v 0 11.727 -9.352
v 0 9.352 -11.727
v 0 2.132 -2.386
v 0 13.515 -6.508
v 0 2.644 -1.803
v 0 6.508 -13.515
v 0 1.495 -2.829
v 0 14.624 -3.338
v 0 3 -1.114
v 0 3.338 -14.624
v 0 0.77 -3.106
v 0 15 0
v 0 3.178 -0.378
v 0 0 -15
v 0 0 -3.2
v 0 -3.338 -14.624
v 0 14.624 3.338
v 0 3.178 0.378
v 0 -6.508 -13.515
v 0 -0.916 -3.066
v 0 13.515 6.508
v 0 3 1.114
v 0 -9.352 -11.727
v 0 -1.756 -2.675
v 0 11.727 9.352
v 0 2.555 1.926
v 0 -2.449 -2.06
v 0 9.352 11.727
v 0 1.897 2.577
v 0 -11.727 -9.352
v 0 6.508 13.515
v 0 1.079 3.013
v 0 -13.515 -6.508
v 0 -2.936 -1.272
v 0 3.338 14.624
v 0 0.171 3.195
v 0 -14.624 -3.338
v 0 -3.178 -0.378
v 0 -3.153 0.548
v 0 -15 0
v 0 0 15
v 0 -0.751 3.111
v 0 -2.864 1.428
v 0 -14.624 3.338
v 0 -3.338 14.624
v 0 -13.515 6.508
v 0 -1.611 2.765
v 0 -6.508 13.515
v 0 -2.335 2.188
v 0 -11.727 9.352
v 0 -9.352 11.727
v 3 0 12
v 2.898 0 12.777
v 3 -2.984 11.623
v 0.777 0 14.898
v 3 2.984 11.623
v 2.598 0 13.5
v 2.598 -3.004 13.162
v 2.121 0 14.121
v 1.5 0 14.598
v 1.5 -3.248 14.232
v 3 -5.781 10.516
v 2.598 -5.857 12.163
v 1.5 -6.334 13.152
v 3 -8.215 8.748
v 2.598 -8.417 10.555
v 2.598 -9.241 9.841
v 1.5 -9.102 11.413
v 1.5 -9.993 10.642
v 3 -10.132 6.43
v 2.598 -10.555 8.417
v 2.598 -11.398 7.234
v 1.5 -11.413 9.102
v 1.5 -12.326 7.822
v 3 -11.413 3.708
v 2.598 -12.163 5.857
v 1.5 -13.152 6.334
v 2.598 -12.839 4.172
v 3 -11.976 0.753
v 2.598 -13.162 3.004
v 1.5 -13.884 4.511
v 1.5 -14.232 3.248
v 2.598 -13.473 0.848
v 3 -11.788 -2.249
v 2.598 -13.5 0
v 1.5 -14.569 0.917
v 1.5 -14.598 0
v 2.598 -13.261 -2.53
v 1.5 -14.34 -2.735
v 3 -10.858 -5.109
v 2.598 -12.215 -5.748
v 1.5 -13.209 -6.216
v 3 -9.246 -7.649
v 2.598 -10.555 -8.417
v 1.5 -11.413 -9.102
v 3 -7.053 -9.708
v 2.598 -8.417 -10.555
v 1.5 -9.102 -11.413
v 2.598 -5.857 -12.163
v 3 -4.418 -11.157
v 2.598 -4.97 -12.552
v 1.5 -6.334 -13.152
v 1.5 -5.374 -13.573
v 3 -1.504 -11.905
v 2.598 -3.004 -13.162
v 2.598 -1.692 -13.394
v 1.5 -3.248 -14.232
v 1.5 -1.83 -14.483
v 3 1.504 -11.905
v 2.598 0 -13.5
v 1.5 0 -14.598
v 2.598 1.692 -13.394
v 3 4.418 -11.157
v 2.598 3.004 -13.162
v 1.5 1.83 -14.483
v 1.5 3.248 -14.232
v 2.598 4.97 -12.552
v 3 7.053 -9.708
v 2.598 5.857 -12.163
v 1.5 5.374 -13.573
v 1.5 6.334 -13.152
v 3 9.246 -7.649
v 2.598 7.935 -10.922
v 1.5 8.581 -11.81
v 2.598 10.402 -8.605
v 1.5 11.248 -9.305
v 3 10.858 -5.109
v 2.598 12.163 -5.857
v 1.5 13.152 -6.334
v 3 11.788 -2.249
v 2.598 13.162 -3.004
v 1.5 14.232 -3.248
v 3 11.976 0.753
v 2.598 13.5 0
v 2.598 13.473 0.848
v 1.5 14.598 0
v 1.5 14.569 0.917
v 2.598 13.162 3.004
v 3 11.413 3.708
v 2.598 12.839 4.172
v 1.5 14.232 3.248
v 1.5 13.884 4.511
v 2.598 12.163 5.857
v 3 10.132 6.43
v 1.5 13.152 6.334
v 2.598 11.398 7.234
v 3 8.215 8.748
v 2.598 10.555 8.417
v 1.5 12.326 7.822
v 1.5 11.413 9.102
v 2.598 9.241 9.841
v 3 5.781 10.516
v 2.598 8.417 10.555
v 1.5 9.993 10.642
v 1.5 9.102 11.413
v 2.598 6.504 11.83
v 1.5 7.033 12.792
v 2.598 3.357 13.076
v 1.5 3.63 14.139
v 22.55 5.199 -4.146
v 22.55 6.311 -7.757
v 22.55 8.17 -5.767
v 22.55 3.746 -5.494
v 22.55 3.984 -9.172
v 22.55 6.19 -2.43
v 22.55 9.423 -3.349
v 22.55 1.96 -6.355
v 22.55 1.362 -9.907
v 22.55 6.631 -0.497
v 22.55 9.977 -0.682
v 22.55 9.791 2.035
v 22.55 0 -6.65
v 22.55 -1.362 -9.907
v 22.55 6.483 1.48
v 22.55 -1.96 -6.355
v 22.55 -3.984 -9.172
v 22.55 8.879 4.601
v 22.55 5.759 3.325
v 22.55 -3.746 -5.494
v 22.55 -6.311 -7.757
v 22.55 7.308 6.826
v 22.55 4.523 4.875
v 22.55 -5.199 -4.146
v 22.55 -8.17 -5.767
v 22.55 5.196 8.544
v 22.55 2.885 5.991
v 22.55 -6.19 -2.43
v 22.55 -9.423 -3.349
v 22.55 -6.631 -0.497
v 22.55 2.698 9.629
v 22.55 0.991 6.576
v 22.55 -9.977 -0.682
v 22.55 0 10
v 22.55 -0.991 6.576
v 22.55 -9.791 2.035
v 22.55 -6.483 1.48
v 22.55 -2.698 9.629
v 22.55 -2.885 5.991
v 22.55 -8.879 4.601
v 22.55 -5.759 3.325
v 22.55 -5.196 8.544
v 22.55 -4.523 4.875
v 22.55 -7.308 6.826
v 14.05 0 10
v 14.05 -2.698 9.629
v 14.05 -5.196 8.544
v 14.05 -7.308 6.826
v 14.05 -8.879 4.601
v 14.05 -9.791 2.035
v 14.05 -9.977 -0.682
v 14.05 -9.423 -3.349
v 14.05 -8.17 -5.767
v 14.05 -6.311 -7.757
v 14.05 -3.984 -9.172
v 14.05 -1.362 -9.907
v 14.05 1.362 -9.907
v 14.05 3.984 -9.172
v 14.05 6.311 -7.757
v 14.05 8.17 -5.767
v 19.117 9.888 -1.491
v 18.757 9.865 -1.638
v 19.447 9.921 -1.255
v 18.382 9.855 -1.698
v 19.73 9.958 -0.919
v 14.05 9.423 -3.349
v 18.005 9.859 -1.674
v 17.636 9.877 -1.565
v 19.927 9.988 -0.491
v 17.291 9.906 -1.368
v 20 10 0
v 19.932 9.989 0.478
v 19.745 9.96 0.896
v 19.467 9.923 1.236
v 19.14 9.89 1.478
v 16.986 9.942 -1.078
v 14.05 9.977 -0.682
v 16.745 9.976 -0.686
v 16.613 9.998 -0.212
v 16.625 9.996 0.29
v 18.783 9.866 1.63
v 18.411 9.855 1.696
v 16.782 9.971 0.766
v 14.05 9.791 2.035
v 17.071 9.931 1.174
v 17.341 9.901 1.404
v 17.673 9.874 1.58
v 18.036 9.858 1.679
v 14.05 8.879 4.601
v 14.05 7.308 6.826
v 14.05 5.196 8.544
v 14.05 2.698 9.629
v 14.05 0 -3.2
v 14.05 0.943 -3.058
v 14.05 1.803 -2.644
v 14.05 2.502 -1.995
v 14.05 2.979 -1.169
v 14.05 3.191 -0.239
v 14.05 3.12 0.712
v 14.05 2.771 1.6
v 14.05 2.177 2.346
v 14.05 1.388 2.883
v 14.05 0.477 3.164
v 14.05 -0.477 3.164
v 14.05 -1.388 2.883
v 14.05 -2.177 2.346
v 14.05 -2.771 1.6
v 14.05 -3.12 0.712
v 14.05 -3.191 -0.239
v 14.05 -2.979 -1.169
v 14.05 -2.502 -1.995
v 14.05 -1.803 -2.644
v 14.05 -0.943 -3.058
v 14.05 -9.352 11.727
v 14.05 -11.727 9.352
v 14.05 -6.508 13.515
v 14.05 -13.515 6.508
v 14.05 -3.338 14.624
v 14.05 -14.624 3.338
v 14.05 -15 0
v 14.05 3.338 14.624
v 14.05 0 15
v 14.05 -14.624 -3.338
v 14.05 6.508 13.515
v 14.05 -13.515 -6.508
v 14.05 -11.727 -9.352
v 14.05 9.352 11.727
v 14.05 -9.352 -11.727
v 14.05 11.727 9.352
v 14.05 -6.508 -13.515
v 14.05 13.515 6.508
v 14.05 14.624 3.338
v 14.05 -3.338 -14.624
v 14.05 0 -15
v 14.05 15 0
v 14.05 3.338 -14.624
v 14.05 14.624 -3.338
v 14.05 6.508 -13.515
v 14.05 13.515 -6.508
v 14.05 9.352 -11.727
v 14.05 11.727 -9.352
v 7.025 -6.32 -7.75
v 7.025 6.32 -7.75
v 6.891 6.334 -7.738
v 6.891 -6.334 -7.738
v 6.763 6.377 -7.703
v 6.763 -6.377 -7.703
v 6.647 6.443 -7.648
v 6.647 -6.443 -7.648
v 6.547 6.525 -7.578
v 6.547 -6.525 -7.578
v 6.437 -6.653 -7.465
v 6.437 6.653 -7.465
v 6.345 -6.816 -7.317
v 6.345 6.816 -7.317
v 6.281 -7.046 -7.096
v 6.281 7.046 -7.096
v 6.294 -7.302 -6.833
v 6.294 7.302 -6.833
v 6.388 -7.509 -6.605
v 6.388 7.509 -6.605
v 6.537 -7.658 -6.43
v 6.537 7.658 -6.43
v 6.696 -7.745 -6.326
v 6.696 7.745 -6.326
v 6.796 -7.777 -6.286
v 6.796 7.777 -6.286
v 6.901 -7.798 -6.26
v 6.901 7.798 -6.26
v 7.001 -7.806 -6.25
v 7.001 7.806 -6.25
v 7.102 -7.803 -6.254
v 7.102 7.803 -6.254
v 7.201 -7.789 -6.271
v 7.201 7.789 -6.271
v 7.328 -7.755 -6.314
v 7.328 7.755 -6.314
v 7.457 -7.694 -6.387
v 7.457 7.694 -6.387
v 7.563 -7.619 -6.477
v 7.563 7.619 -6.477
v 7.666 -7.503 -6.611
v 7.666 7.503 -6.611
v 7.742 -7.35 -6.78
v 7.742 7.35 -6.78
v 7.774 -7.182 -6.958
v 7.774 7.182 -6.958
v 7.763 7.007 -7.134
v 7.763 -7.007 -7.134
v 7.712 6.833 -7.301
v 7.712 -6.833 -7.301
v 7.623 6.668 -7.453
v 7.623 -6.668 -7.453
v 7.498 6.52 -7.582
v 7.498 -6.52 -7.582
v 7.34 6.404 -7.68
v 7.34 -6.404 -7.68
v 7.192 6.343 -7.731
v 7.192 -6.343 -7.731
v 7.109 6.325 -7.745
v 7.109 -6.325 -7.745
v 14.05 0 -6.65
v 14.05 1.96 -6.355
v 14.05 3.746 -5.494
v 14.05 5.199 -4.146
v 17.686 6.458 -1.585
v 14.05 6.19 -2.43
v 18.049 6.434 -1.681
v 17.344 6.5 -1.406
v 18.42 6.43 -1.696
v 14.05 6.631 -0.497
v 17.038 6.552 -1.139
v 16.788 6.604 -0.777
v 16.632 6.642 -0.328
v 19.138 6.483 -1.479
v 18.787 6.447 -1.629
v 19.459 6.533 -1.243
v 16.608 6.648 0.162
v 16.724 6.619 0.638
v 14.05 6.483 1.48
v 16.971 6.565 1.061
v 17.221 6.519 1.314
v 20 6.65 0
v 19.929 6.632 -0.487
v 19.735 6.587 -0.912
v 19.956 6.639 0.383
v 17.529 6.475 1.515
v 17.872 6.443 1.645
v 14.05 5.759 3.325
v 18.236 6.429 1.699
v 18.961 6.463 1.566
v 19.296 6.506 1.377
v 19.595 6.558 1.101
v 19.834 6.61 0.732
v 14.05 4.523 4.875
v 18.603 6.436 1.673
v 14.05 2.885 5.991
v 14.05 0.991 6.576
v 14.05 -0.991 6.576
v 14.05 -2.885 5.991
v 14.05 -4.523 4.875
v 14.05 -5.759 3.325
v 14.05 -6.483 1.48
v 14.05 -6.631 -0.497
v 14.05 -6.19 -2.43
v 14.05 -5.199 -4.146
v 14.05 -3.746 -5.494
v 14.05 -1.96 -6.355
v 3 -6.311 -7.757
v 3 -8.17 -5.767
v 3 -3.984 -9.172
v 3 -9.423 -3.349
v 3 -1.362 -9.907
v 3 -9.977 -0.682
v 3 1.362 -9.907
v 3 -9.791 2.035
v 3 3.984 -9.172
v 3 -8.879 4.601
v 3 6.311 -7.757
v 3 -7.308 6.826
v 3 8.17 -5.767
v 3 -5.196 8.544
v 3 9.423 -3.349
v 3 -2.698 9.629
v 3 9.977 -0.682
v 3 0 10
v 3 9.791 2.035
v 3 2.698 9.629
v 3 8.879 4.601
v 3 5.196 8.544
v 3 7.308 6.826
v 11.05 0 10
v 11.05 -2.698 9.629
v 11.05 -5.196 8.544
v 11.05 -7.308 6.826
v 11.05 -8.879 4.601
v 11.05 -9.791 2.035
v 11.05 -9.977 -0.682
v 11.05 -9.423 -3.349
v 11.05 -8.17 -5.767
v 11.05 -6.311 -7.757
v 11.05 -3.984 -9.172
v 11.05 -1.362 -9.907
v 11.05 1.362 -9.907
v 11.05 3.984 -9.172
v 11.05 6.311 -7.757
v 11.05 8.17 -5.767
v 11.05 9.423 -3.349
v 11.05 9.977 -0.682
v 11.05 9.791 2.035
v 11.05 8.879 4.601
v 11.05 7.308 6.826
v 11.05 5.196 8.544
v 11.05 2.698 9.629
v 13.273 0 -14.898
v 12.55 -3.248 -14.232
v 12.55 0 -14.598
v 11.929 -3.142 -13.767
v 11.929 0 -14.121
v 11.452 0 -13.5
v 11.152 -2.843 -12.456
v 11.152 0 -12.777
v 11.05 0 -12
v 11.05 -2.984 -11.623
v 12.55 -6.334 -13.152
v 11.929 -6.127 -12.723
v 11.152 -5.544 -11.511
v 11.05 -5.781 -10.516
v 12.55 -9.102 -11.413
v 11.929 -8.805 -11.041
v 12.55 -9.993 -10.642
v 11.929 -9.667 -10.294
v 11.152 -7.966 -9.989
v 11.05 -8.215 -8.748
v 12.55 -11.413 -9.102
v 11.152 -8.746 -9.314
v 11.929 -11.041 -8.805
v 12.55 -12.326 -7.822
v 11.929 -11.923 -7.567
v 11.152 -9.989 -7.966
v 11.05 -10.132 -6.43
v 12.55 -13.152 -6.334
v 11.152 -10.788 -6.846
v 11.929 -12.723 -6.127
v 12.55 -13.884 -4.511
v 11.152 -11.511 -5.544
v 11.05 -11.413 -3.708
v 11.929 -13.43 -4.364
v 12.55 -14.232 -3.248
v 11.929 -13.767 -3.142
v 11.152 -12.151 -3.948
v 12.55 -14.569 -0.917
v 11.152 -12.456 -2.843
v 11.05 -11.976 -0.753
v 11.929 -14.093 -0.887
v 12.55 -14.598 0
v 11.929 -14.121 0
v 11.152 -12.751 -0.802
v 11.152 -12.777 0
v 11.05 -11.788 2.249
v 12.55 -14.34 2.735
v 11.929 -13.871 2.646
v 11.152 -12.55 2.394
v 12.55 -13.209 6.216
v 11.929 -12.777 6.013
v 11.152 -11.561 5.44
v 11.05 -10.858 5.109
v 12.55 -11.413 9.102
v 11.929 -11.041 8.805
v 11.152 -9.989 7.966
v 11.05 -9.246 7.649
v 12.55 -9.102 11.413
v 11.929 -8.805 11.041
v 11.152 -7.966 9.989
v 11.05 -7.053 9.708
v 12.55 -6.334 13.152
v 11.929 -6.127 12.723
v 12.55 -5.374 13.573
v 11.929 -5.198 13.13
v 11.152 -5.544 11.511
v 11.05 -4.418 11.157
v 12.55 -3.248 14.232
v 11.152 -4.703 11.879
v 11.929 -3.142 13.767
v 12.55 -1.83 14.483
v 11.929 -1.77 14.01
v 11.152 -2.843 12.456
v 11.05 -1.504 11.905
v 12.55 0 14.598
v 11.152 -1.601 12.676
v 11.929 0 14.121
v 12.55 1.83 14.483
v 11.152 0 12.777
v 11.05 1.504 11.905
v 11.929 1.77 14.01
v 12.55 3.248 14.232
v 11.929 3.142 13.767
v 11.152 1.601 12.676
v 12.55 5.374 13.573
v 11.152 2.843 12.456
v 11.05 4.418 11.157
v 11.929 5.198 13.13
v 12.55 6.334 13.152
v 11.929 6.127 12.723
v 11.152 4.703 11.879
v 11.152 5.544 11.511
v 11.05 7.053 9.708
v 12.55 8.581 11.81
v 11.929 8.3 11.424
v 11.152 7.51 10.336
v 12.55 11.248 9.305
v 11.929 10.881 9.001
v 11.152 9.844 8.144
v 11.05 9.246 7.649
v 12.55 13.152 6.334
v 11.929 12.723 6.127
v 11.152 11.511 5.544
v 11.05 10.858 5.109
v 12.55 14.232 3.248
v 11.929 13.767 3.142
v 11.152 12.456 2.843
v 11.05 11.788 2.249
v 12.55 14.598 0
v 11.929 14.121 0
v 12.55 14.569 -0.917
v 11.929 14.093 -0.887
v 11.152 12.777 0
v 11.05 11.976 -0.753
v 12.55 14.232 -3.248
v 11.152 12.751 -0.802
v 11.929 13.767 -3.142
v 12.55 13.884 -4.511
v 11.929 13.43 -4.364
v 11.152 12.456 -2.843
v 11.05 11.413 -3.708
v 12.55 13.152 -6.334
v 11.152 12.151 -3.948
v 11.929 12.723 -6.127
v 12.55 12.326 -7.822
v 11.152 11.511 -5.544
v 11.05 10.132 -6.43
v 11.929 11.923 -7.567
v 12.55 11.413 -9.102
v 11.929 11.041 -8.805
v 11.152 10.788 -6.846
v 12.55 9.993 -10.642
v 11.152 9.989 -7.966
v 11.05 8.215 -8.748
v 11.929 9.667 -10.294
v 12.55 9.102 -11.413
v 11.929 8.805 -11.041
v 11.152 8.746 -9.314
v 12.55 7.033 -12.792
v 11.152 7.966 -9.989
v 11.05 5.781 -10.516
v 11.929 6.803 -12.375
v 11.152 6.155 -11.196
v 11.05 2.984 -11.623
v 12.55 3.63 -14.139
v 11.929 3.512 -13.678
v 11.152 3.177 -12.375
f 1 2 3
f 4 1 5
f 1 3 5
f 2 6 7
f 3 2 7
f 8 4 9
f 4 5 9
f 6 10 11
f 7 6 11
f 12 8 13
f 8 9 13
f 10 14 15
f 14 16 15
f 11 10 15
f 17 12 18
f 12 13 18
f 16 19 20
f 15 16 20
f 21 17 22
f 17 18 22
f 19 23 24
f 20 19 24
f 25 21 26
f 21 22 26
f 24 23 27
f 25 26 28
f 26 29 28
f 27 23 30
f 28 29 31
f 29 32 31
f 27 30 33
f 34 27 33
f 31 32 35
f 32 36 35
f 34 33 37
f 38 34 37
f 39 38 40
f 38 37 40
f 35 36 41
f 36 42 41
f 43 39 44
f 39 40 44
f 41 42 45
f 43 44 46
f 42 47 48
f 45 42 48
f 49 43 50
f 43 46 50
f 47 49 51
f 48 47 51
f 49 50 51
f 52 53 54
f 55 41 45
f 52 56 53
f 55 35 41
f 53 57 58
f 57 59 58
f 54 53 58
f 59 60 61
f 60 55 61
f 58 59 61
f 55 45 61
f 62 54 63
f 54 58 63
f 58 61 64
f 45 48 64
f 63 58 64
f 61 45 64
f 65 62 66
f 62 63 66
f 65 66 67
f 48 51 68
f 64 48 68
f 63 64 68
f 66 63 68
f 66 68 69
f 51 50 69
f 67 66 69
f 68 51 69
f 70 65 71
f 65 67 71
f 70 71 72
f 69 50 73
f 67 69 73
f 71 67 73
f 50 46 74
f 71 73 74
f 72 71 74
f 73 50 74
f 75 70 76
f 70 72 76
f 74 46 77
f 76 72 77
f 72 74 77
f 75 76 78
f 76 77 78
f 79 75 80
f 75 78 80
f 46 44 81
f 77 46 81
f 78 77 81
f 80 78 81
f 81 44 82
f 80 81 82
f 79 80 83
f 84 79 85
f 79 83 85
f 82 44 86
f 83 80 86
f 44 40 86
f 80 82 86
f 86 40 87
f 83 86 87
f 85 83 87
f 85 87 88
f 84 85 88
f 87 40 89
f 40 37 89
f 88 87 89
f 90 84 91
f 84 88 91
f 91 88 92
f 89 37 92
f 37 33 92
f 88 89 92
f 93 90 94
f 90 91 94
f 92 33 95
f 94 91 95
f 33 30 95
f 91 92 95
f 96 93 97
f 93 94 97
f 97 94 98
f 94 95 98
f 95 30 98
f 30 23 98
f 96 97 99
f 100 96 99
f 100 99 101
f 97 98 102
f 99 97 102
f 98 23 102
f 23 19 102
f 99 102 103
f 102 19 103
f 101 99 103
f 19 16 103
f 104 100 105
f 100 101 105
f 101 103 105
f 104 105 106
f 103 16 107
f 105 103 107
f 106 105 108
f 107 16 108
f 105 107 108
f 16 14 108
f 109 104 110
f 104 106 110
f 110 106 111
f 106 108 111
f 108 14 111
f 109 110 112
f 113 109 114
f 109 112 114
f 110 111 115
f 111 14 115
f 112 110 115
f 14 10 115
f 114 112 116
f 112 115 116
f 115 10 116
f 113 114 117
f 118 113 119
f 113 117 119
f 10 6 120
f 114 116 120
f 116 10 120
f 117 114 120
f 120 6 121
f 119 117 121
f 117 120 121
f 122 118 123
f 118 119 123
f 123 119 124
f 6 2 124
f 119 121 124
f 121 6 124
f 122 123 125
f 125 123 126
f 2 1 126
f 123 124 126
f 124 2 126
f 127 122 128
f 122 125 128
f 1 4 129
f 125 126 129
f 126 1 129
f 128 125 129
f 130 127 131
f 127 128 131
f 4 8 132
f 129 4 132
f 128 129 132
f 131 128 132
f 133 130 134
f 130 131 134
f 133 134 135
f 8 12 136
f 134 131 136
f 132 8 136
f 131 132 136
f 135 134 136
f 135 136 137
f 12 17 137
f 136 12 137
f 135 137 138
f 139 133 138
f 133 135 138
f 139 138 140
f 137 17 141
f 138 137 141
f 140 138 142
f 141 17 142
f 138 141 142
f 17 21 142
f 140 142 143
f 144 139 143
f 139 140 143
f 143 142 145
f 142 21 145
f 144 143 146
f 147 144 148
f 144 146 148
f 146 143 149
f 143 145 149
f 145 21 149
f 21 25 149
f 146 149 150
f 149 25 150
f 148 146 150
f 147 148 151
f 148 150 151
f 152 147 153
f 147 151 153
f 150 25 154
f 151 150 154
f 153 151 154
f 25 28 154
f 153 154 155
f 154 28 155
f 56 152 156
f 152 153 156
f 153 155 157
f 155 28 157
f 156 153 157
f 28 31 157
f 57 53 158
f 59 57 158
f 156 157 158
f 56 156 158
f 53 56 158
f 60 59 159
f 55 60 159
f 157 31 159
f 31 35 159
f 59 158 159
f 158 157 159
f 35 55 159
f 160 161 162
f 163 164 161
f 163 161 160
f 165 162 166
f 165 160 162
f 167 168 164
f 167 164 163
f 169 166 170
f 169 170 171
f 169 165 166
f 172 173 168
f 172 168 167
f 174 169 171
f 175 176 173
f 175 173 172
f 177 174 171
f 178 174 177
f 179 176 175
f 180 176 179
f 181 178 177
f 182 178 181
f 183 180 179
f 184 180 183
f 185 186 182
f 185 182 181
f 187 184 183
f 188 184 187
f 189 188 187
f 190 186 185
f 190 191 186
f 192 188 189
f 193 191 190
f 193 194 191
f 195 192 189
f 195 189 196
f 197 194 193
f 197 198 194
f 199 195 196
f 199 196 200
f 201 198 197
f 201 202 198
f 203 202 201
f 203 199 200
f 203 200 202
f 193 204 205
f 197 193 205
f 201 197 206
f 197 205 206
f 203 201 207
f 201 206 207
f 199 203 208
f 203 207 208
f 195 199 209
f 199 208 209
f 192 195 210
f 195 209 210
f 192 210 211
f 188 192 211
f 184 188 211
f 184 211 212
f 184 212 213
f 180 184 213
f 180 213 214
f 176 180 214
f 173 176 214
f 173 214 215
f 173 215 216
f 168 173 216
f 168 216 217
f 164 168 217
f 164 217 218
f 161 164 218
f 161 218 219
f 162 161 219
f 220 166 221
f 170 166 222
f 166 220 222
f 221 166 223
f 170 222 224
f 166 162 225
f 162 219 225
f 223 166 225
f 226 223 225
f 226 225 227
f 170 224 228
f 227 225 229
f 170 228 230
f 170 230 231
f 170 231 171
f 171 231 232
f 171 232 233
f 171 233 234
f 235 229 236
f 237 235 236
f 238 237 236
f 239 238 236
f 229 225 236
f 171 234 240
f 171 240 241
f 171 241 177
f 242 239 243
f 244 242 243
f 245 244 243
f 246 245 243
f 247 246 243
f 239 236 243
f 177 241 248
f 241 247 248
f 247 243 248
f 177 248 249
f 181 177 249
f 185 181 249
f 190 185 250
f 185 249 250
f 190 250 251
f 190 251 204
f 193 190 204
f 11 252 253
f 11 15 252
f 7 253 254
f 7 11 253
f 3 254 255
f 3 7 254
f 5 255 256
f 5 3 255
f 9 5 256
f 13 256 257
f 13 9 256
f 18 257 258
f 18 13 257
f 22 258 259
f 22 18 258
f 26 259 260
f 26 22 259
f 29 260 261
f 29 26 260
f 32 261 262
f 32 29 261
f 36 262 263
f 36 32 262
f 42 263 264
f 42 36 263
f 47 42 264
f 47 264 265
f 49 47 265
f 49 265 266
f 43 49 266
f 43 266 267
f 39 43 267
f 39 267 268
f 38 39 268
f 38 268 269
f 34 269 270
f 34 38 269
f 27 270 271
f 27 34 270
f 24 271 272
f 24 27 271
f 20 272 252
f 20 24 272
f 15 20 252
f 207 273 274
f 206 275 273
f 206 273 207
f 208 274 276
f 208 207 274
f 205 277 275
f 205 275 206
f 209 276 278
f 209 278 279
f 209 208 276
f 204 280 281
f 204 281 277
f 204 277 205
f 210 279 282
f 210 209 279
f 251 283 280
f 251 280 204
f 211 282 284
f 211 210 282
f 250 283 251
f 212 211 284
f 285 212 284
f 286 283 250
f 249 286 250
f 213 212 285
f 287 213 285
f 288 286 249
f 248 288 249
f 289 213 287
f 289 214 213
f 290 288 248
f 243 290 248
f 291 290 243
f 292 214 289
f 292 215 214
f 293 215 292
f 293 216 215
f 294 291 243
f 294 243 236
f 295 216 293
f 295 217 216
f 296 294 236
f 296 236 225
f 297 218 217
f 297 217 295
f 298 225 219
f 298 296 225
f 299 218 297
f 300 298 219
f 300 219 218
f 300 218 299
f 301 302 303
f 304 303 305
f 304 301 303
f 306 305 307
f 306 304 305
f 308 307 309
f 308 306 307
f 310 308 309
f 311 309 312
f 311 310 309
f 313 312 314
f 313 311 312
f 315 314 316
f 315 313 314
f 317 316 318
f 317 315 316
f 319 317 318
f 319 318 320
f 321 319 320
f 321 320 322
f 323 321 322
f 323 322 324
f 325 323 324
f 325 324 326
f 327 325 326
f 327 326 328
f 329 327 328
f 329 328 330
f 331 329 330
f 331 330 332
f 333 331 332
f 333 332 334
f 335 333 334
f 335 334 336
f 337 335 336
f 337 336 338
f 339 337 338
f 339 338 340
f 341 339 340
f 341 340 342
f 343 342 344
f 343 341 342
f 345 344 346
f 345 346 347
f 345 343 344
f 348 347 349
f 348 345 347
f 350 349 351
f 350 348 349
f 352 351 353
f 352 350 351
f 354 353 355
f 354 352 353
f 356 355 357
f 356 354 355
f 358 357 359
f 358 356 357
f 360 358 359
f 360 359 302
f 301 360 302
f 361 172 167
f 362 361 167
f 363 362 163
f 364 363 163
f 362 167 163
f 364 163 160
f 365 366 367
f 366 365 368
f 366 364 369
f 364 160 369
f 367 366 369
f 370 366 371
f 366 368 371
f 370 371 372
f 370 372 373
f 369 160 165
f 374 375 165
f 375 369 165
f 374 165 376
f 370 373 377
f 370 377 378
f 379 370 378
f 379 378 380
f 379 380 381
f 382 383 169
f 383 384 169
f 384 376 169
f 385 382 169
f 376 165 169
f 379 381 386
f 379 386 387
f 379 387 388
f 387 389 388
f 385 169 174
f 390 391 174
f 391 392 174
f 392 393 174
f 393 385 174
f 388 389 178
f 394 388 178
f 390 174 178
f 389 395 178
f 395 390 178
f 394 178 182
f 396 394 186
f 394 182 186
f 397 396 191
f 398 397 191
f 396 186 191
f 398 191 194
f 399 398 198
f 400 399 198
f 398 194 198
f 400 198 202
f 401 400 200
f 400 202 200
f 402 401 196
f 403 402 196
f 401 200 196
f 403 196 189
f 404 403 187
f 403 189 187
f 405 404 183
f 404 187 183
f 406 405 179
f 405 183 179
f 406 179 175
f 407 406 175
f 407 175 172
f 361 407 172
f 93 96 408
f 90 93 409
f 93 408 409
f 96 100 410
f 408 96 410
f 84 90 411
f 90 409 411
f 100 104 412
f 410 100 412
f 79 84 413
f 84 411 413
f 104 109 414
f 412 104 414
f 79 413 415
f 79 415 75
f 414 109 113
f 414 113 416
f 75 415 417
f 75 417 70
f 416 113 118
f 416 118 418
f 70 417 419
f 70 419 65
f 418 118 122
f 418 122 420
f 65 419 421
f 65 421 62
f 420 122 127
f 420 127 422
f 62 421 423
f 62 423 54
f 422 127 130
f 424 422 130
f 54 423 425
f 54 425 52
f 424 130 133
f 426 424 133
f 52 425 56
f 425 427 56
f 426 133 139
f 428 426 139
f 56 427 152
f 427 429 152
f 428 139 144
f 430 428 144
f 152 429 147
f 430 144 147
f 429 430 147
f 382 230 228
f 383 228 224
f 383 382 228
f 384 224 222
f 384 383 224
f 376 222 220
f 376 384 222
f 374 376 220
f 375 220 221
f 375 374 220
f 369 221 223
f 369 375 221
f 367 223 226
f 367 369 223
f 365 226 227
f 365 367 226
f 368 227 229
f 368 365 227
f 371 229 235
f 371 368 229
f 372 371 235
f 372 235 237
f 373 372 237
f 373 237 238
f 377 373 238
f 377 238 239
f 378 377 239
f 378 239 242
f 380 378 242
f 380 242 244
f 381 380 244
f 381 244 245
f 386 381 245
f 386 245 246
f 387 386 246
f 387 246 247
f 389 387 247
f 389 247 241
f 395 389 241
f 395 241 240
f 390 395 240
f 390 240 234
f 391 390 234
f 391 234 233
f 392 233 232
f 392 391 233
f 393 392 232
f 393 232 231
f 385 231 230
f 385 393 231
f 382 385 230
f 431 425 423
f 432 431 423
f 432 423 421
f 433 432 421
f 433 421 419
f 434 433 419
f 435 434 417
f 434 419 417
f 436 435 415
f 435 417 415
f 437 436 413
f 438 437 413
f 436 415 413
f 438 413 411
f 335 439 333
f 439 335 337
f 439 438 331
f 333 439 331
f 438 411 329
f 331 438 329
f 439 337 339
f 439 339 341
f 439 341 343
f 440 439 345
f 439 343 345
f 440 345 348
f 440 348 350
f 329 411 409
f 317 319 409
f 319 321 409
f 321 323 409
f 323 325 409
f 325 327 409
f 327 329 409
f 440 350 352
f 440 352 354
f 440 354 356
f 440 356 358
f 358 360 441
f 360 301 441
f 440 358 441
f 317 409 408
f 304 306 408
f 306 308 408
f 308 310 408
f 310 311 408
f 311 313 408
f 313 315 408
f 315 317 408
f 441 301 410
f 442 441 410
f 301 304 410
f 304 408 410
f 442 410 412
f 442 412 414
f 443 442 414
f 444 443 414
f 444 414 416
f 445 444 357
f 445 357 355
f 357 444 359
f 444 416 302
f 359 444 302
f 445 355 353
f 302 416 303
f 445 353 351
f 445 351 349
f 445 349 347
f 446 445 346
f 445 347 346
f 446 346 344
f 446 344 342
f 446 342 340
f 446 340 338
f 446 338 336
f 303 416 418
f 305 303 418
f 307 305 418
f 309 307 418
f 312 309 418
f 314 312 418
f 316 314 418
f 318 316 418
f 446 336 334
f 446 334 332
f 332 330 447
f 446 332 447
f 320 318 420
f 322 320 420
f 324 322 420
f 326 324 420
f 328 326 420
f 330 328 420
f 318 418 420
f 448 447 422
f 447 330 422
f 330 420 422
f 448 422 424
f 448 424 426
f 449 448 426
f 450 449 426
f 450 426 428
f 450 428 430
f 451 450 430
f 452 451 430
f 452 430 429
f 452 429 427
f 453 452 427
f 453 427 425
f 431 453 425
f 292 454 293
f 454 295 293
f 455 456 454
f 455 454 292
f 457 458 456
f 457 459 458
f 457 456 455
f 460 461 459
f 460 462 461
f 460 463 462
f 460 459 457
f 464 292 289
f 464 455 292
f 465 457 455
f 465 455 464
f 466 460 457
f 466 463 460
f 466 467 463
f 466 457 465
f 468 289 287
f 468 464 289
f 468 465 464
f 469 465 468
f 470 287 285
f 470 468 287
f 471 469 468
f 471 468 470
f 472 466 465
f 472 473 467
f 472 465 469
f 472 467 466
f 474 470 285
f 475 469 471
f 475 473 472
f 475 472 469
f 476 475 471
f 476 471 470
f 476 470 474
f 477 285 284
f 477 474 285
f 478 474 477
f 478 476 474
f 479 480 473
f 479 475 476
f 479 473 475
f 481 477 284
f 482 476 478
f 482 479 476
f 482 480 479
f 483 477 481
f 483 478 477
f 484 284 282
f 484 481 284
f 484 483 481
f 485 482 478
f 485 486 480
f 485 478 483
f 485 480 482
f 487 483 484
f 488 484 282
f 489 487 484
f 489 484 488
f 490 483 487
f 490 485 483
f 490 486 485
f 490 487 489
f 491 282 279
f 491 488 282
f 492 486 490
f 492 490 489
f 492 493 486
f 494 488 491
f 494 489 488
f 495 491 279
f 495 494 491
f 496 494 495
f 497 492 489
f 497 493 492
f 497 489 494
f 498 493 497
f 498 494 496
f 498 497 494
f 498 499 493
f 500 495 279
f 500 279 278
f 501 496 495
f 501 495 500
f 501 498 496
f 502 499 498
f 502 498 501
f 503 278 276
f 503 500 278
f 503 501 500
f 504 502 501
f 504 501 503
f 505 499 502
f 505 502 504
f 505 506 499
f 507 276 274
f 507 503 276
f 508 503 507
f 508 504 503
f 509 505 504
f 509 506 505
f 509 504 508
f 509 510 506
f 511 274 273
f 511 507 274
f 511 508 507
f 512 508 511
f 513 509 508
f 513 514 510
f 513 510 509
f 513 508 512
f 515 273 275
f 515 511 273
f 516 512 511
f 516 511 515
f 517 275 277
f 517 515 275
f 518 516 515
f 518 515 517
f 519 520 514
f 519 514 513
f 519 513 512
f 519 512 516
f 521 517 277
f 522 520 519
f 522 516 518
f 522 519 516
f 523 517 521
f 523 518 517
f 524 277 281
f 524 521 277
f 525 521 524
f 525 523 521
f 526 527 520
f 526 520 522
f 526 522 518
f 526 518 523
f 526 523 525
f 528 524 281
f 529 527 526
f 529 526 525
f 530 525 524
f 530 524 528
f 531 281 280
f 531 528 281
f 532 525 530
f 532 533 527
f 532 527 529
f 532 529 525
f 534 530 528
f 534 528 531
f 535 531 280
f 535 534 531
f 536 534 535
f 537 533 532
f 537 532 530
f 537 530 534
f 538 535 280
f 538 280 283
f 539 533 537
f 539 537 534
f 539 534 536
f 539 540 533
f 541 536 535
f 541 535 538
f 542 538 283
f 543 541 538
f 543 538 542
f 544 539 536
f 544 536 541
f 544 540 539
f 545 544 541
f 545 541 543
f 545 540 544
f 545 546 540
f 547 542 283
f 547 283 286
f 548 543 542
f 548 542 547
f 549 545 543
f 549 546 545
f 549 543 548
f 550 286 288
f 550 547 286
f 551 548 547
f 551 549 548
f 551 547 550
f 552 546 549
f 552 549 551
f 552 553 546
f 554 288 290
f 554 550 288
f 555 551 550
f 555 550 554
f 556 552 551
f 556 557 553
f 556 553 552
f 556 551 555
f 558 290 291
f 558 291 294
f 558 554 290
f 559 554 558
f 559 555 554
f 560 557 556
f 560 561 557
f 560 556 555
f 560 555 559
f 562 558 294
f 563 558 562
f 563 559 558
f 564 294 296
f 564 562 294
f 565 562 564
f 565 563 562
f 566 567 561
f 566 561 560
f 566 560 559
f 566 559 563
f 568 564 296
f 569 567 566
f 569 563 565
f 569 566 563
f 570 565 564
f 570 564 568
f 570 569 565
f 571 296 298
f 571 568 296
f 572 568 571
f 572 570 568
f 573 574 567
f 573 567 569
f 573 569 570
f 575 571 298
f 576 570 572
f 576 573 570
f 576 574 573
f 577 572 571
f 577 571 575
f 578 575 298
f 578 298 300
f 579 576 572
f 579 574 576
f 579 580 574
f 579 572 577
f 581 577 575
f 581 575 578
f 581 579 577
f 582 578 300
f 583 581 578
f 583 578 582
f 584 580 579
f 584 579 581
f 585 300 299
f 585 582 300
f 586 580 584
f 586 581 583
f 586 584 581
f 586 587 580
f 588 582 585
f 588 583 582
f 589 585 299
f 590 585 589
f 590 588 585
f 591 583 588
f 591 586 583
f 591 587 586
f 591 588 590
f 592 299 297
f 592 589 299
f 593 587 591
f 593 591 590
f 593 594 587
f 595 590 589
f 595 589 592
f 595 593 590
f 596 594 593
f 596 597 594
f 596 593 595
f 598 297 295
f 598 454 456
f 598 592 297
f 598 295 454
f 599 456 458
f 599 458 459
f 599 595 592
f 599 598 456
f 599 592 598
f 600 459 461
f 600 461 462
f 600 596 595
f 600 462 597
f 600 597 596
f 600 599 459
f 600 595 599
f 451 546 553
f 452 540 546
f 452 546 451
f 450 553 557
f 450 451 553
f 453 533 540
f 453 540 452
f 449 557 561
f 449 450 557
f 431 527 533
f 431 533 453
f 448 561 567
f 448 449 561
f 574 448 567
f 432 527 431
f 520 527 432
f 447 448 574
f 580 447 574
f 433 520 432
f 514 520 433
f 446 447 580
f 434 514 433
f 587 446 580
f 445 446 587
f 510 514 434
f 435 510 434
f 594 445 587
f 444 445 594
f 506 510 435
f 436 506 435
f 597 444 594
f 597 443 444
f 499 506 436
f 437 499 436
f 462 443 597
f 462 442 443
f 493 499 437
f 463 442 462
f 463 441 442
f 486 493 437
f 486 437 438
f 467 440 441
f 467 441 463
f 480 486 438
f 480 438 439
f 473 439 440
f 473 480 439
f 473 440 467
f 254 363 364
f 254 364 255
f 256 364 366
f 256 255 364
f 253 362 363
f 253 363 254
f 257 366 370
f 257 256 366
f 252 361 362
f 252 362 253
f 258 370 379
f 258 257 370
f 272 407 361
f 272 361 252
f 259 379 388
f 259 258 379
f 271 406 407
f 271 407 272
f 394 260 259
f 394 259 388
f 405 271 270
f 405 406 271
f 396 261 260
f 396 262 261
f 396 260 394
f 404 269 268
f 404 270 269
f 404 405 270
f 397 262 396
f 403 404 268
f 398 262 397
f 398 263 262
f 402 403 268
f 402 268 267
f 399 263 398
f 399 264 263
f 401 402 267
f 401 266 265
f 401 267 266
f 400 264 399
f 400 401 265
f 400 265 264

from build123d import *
from build123d.topology import SkipClean

# Parameters (mm, degrees)
EXTRUDE_3_DEPTH          = 14.35
EXTRUDE_START            = -3
EXTRUDE_7_DEPTH          = 3
EXTRUDE_8_DEPTH          = 3
EXTRUDE_START_2          = 10
EXTRUDE_9_DEPTH          = 10
EXTRUDE_10_DEPTH         = 10
CUT_EXTRUDE_1_DEPTH      = 10
CUT_EXTRUDE_2_DEPTH      = 14
FILLET_1_R               = 5
SKETCH_10_W              = 10.354719005
SKETCH_10_H              = 30
SKETCH_10_W_2            = 10.898600502
CUT_EXTRUDE_3_DEPTH      = 14
CUT_EXTRUDE_START        = -11.35
SKETCH_11_R              = 6.6
CUT_EXTRUDE_4_DEPTH      = 11.35
EXTRUDE_START_3          = -14.35
SKETCH_12_R              = 10
SKETCH_12_R_2            = 6.6
EXTRUDE_11_DEPTH         = 14.35
SKETCH_13_R              = 15
SKETCH_13_R_2            = 10
EXTRUDE_12_DEPTH         = 3
SKETCH_14_R              = 15
SKETCH_14_R_2            = 3.2
EXTRUDE_13_DEPTH         = 3
CUT_EXTRUDE_START_2      = -0.3
SKETCH_17_R              = 15
CUT_EXTRUDE_5_DEPTH      = 0.3
EXTRUDE_START_4          = 0.3
SKETCH_18_R              = 15
SKETCH_18_R_2            = 10
EXTRUDE_14_DEPTH         = 0.3
CUT_EXTRUDE_6_DEPTH      = 19.3
SKETCH_20_R              = 10
SKETCH_20_R_2            = 3.2
EXTRUDE_15_DEPTH         = 11.05
SKETCH_21_R              = 10
SKETCH_21_R_2            = 6.6
EXTRUDE_16_DEPTH         = 8.5
CUT_EXTRUDE_7_DEPTH      = 13.5
FILLET_2_R               = 3
CUT_EXTRUDE_9_DEPTH      = 10
CUT_EXTRUDE_9_DEPTH_BACK = 10
SKETCH_23_R              = 0.75
CUT_EXTRUDE_10_REACH     = 32.96
SKETCH_25_R              = 6.65


with BuildPart() as part:
    # Эскиз1 → Бобышка-Вытянуть3 (new body)
    with BuildSketch(Plane(origin=(0, 0, 0), x_dir=(0, 0, -1), z_dir=(1, 0, 0))):
        with BuildLine():
            ThreePointArc((-6.6, 0), (0, 6.6), (6.6, 0))
            Line((6.6, 0), (10, 0))
            ThreePointArc((10, 0), (0, 10), (-10, 0))
            Line((-10, 0), (-6.6, 0))
        make_face()
    extrude(amount=EXTRUDE_3_DEPTH)

    # Эскиз3 → Бобышка-Вытянуть7 (add)
    with BuildSketch(Plane(origin=(14.35, 0, 0), x_dir=(0, 0, -1), z_dir=(1, 0, 0)).offset(EXTRUDE_START)):
        with BuildLine():
            ThreePointArc((15, 0), (0, 15), (-15, 0))
            Line((-15, 0), (-10, 0))
            ThreePointArc((-10, 0), (0, 10), (10, 0))
            Line((10, 0), (15, 0))
        make_face()
        with BuildLine():
            ThreePointArc((6.6, 0), (0, 6.6), (-6.6, 0))
            Line((-6.6, 0), (-3.2, 0))
            ThreePointArc((-3.2, 0), (0, 3.2), (3.2, 0))
            Line((3.2, 0), (6.6, 0))
        make_face()
    extrude(amount=EXTRUDE_7_DEPTH)

    # Эскиз5 → Бобышка-Вытянуть8 (add)
    with BuildSketch(Plane.ZY):
        with BuildLine():
            ThreePointArc((15, 0), (0, 15), (-15, 0))
            Line((-15, 0), (-10, 0))
            ThreePointArc((-10, 0), (0, 10), (10, 0))
            Line((10, 0), (15, 0))
        make_face()
        with BuildLine():
            ThreePointArc((6.6, 0), (0, 6.6), (-6.6, 0))
            Line((-6.6, 0), (-3.2, 0))
            ThreePointArc((-3.2, 0), (0, 3.2), (3.2, 0))
            Line((3.2, 0), (6.6, 0))
        make_face()
    extrude(amount=-EXTRUDE_8_DEPTH)

    # Эскиз6 → Бобышка-Вытянуть9 (add)
    with BuildSketch(Plane.ZY.offset(EXTRUDE_START_2)):
        with BuildLine():
            ThreePointArc((-6.6, 0), (-6.41716127, 1.542738227), (-5.878775383, 3))
            Line((-5.878775383, 3), (-6.6, 3))
            Line((-6.6, 3), (-14.696938457, 3))
            Line((-14.696938457, 3), (-14.696938457, 0))
            Line((-14.696938457, 0), (-6.6, 0))
        make_face()
        with BuildLine():
            ThreePointArc((-3.2, 0), (-2.627105745, 1.827105745), (-1.113552873, 3))
            Line((-1.113552873, 3), (-5.878775383, 3))
            ThreePointArc((-5.878775383, 3), (-6.41716127, 1.542738227), (-6.6, 0))
            Line((-6.6, 0), (-3.2, 0))
        make_face()
        with BuildLine():
            Line((-5.878775383, 3), (-1.113552873, 3))
            ThreePointArc((-1.113552873, 3), (0, 3.2), (1.113552873, 3))
            Line((1.113552873, 3), (5.878775383, 3))
            ThreePointArc((5.878775383, 3), (0, 6.6), (-5.878775383, 3))
        make_face()
        with BuildLine():
            Line((5.878775383, 3), (1.113552873, 3))
            ThreePointArc((1.113552873, 3), (2.627105745, 1.827105745), (3.2, 0))
            Line((3.2, 0), (6.6, 0))
            ThreePointArc((6.6, 0), (6.41716127, 1.542738227), (5.878775383, 3))
        make_face()
        with BuildLine():
            Line((14.696938457, 3), (5.878775383, 3))
            ThreePointArc((5.878775383, 3), (6.41716127, 1.542738227), (6.6, 0))
            Line((6.6, 0), (14.696938457, 0))
            Line((14.696938457, 0), (14.696938457, 3))
        make_face()
    extrude(amount=-EXTRUDE_9_DEPTH)

    # Эскиз7 → Бобышка-Вытянуть10 (add)
    with BuildSketch(Plane(origin=(14.35, 0, 0), x_dir=(0, 0, -1), z_dir=(1, 0, 0))):
        with BuildLine():
            Line((6.6, 0), (14.696938457, 0))
            Line((14.696938457, 0), (14.696938457, 3))
            Line((14.696938457, 3), (5.878775383, 3))
            ThreePointArc((5.878775383, 3), (6.41716127, 1.542738227), (6.6, 0))
        make_face()
        with BuildLine():
            Line((3.2, 0), (6.6, 0))
            ThreePointArc((6.6, 0), (6.41716127, 1.542738227), (5.878775383, 3))
            ThreePointArc((5.878775383, 3), (0, 6.6), (-5.878775383, 3))
            ThreePointArc((-5.878775383, 3), (-6.41716127, 1.542738227), (-6.6, 0))
            Line((-6.6, 0), (-3.2, 0))
            ThreePointArc((-3.2, 0), (0, 3.2), (3.2, 0))
        make_face()
        with BuildLine():
            Line((-14.696938457, 0), (-6.6, 0))
            ThreePointArc((-6.6, 0), (-6.41716127, 1.542738227), (-5.878775383, 3))
            Line((-5.878775383, 3), (-14.696938457, 3))
            Line((-14.696938457, 3), (-14.696938457, 0))
        make_face()
    extrude(amount=EXTRUDE_10_DEPTH)

    # Эскиз8 → Вырез-Вытянуть1 (cut)
    with BuildSketch(Plane(origin=(0, 3, 0), x_dir=(1, 0, 0), z_dir=(0, 1, 0))):
        with BuildLine():
            ThreePointArc((-5, 11.98785692), (-6.7, 10.28785692), (-5, 8.58785692))
            Line((-5, 8.58785692), (-5, 11.98785692))
        make_face()
        with BuildLine():
            Line((-5, 11.98785692), (-5, 8.58785692))
            ThreePointArc((-5, 8.58785692), (-3.797918472, 9.085775392), (-3.3, 10.28785692))
            ThreePointArc((-3.3, 10.28785692), (-3.797918472, 11.489938448), (-5, 11.98785692))
        make_face()
        with BuildLine():
            ThreePointArc((21.05, 10.28785692), (20.552081528, 11.489938448), (19.35, 11.98785692))
            Line((19.35, 11.98785692), (19.35, 8.58785692))
            ThreePointArc((19.35, 8.58785692), (20.552081528, 9.085775392), (21.05, 10.28785692))
        make_face()
        with BuildLine():
            Line((19.35, 8.58785692), (19.35, 11.98785692))
            ThreePointArc((19.35, 11.98785692), (17.65, 10.28785692), (19.35, 8.58785692))
        make_face()
        with BuildLine():
            ThreePointArc((21.05, -10.28785692), (20.552081528, -9.085775392), (19.35, -8.58785692))
            Line((19.35, -8.58785692), (19.35, -11.98785692))
            ThreePointArc((19.35, -11.98785692), (20.552081528, -11.489938448), (21.05, -10.28785692))
        make_face()
        with BuildLine():
            Line((19.35, -11.98785692), (19.35, -8.58785692))
            ThreePointArc((19.35, -8.58785692), (17.65, -10.28785692), (19.35, -11.98785692))
        make_face()
        with BuildLine():
            ThreePointArc((-3.3, -10.28785692), (-3.797918472, -9.085775392), (-5, -8.58785692))
            Line((-5, -8.58785692), (-5, -11.98785692))
            ThreePointArc((-5, -11.98785692), (-3.797918472, -11.489938448), (-3.3, -10.28785692))
        make_face()
        with BuildLine():
            Line((-5, -11.98785692), (-5, -8.58785692))
            ThreePointArc((-5, -8.58785692), (-6.7, -10.28785692), (-5, -11.98785692))
        make_face()
    extrude(amount=-CUT_EXTRUDE_1_DEPTH, mode=Mode.SUBTRACT)

    # Эскиз9 → Вырез-Вытянуть2 (cut)
    with BuildSketch(Plane.XZ):
        with BuildLine():
            ThreePointArc((8.875, 0), (8.377081528, 1.202081528), (7.175, 1.7))
            Line((7.175, 1.7), (7.175, -1.7))
            ThreePointArc((7.175, -1.7), (8.377081528, -1.202081528), (8.875, 0))
        make_face()
        with BuildLine():
            Line((7.175, -1.7), (7.175, 1.7))
            ThreePointArc((7.175, 1.7), (5.475, 0), (7.175, -1.7))
        make_face()
    extrude(amount=-CUT_EXTRUDE_2_DEPTH, mode=Mode.SUBTRACT)

    # Скругление1
    fillet_1_edges = [part.edges().sort_by_distance(p)[0] for p in [
        (24.35, 1.5, -14.696938457),
        (-10, 1.5, 14.696938457),
        (-10, 1.5, -14.696938457),
        (24.35, 1.5, 14.696938457),
    ]]
    fillet(fillet_1_edges, radius=FILLET_1_R)

    # Эскиз10 → Вырез-Вытянуть3 (cut)
    with BuildSketch(Plane.XZ):
        with Locations((-5.177359503, 0)):
            Rectangle(SKETCH_10_W, SKETCH_10_H)
        with Locations((19.799300251, 0)):
            Rectangle(SKETCH_10_W_2, SKETCH_10_H)
    extrude(amount=-CUT_EXTRUDE_3_DEPTH, mode=Mode.SUBTRACT)

    # Эскиз11 → Вырез-Вытянуть4 (cut)
    with SkipClean():  # the faces are left unmerged after this step: merging them gives an invalid solid
        with BuildSketch(Plane(origin=(14.35, 0, 0), x_dir=(0, 0, -1), z_dir=(1, 0, 0)).offset(CUT_EXTRUDE_START)):
            Circle(SKETCH_11_R)
        extrude(amount=CUT_EXTRUDE_4_DEPTH, mode=Mode.SUBTRACT)

    # Эскиз12 → Бобышка-Вытянуть11 (add)
    with BuildSketch(Plane(origin=(14.35, 0, 0), x_dir=(0, 0, -1), z_dir=(1, 0, 0)).offset(EXTRUDE_START_3)):
        with Locations(Location((0, 0, 0), (0, 0, 180))):
            Circle(SKETCH_12_R)
        Circle(SKETCH_12_R_2, mode=Mode.SUBTRACT)
    extrude(amount=EXTRUDE_11_DEPTH)

    # Эскиз13 → Бобышка-Вытянуть12 (add)
    with BuildSketch(Plane(origin=(14.35, 0, 0), x_dir=(0, 0, -1), z_dir=(1, 0, 0)).offset(EXTRUDE_START)):
        Circle(SKETCH_13_R)
        Circle(SKETCH_13_R_2, mode=Mode.SUBTRACT)
    extrude(amount=EXTRUDE_12_DEPTH)

    # Эскиз14 → Бобышка-Вытянуть13 (add)
    with SkipClean():  # the faces are left unmerged after this step: merging them gives an invalid solid
        with BuildSketch(Plane.ZY):
            with Locations(Location((0, 0, 0), (0, 0, 180))):
                Circle(SKETCH_14_R)
            Circle(SKETCH_14_R_2, mode=Mode.SUBTRACT)
        extrude(amount=-EXTRUDE_13_DEPTH)

    # Эскиз17 → Вырез-Вытянуть5 (cut)
    with SkipClean():  # the faces are left unmerged after this step: merging them gives an invalid solid
        with BuildSketch(Plane(origin=(14.35, 0, 0), x_dir=(0, 0, -1), z_dir=(1, 0, 0)).offset(CUT_EXTRUDE_START_2)):
            Circle(SKETCH_17_R)
        extrude(amount=CUT_EXTRUDE_5_DEPTH, mode=Mode.SUBTRACT)

    # Эскиз18 → Бобышка-Вытянуть14 (add)
    with SkipClean():  # the faces are left unmerged after this step: merging them gives an invalid solid
        with BuildSketch(Plane.ZY.offset(-11.35).offset(EXTRUDE_START_4)):
            with Locations(Location((0, 0, 0), (0, 0, 180))):
                Circle(SKETCH_18_R)
            Circle(SKETCH_18_R_2, mode=Mode.SUBTRACT)
        extrude(amount=-EXTRUDE_14_DEPTH)

    # Эскиз19 → Вырез-Вытянуть6 (cut)
    with BuildSketch(Plane(origin=(0, 0, 0), x_dir=(1, 0, 0), z_dir=(0, 1, 0))):
        with BuildLine():
            ThreePointArc((8.725, 0), (7.025, 1.7), (5.325, 0))
            Line((5.325, 0), (8.725, 0))
        make_face()
        with BuildLine():
            Line((8.725, 0), (5.325, 0))
            ThreePointArc((5.325, 0), (7.025, -1.7), (8.725, 0))
        make_face()
    extrude(amount=CUT_EXTRUDE_6_DEPTH, mode=Mode.SUBTRACT)

    # Эскиз20 → Бобышка-Вытянуть15 (add)
    with BuildSketch(Plane(origin=(3, 0, 0), x_dir=(0, 0, -1), z_dir=(1, 0, 0))):
        with Locations(Location((0, 0, 0), (0, 0, 180))):
            Circle(SKETCH_20_R)
        Circle(SKETCH_20_R_2, mode=Mode.SUBTRACT)
    extrude(amount=EXTRUDE_15_DEPTH)

    # Эскиз21 → Бобышка-Вытянуть16 (add)
    with BuildSketch(Plane(origin=(14.05, 0, 0), x_dir=(0, 0, -1), z_dir=(1, 0, 0))):
        with Locations(Location((0, 0, 0), (0, 0, 180))):
            Circle(SKETCH_21_R)
        Circle(SKETCH_21_R_2, mode=Mode.SUBTRACT)
    extrude(amount=EXTRUDE_16_DEPTH)

    # Эскиз22 → Вырез-Вытянуть7 (cut)
    with BuildSketch(Plane(origin=(0, 0, 0), x_dir=(1, 0, 0), z_dir=(0, 1, 0))):
        with BuildLine():
            ThreePointArc((16.6, 0), (18.3, -1.7), (20, 0))
            Line((20, 0), (16.6, 0))
        make_face()
        with BuildLine():
            Line((16.6, 0), (20, 0))
            ThreePointArc((20, 0), (18.3, 1.7), (16.6, 0))
        make_face()
    extrude(amount=CUT_EXTRUDE_7_DEPTH, mode=Mode.SUBTRACT)

    # Скругление2
    fillet_2_edges = [part.edges().sort_by_distance(p)[0] for p in [
        (11.05, 0, 15),
        (3, 0, -15),
    ]]
    fillet(fillet_2_edges, radius=FILLET_2_R - 0.0001)  # a hair under: the kernel refuses the full size

    # Эскиз23 → Вырез-Вытянуть9 (cut, two sides: drawn at the far end of the back side and taken through both)
    with BuildSketch(Plane(origin=(0, 0, 0), x_dir=(1, 0, 0), z_dir=(0, 1, 0)).offset(-CUT_EXTRUDE_9_DEPTH_BACK)):
        with Locations(Location((7.025, 7, 0), (0, 0, 90))):
            Circle(SKETCH_23_R)
    extrude(amount=CUT_EXTRUDE_9_DEPTH + CUT_EXTRUDE_9_DEPTH_BACK, mode=Mode.SUBTRACT)

    # Вырез-Вытянуть10: up to this face of the body (flat: up to its plane)
    cut_extrude_10_end = Plane(part.part.faces().sort_by_distance((14.05, 0, 6.41332381))[0])
    # Эскиз25 → Вырез-Вытянуть10 (cut, up to the picked face)
    with BuildSketch(Plane(origin=(22.55, 0, 0), x_dir=(0, 0, -1), z_dir=(1, 0, 0)), mode=Mode.PRIVATE) as cut_extrude_10_sk1:
        Circle(SKETCH_25_R)
    cut_extrude_10_tool1 = split(extrude(cut_extrude_10_sk1.sketch, amount=-CUT_EXTRUDE_10_REACH, mode=Mode.PRIVATE), bisect_by=cut_extrude_10_end, keep=Keep.BOTH, mode=Mode.PRIVATE)
    add(cut_extrude_10_tool1.solids().sort_by(Axis((22.55, 0, 0), (-1, 0, 0)))[0], mode=Mode.SUBTRACT)


solid = part.part
